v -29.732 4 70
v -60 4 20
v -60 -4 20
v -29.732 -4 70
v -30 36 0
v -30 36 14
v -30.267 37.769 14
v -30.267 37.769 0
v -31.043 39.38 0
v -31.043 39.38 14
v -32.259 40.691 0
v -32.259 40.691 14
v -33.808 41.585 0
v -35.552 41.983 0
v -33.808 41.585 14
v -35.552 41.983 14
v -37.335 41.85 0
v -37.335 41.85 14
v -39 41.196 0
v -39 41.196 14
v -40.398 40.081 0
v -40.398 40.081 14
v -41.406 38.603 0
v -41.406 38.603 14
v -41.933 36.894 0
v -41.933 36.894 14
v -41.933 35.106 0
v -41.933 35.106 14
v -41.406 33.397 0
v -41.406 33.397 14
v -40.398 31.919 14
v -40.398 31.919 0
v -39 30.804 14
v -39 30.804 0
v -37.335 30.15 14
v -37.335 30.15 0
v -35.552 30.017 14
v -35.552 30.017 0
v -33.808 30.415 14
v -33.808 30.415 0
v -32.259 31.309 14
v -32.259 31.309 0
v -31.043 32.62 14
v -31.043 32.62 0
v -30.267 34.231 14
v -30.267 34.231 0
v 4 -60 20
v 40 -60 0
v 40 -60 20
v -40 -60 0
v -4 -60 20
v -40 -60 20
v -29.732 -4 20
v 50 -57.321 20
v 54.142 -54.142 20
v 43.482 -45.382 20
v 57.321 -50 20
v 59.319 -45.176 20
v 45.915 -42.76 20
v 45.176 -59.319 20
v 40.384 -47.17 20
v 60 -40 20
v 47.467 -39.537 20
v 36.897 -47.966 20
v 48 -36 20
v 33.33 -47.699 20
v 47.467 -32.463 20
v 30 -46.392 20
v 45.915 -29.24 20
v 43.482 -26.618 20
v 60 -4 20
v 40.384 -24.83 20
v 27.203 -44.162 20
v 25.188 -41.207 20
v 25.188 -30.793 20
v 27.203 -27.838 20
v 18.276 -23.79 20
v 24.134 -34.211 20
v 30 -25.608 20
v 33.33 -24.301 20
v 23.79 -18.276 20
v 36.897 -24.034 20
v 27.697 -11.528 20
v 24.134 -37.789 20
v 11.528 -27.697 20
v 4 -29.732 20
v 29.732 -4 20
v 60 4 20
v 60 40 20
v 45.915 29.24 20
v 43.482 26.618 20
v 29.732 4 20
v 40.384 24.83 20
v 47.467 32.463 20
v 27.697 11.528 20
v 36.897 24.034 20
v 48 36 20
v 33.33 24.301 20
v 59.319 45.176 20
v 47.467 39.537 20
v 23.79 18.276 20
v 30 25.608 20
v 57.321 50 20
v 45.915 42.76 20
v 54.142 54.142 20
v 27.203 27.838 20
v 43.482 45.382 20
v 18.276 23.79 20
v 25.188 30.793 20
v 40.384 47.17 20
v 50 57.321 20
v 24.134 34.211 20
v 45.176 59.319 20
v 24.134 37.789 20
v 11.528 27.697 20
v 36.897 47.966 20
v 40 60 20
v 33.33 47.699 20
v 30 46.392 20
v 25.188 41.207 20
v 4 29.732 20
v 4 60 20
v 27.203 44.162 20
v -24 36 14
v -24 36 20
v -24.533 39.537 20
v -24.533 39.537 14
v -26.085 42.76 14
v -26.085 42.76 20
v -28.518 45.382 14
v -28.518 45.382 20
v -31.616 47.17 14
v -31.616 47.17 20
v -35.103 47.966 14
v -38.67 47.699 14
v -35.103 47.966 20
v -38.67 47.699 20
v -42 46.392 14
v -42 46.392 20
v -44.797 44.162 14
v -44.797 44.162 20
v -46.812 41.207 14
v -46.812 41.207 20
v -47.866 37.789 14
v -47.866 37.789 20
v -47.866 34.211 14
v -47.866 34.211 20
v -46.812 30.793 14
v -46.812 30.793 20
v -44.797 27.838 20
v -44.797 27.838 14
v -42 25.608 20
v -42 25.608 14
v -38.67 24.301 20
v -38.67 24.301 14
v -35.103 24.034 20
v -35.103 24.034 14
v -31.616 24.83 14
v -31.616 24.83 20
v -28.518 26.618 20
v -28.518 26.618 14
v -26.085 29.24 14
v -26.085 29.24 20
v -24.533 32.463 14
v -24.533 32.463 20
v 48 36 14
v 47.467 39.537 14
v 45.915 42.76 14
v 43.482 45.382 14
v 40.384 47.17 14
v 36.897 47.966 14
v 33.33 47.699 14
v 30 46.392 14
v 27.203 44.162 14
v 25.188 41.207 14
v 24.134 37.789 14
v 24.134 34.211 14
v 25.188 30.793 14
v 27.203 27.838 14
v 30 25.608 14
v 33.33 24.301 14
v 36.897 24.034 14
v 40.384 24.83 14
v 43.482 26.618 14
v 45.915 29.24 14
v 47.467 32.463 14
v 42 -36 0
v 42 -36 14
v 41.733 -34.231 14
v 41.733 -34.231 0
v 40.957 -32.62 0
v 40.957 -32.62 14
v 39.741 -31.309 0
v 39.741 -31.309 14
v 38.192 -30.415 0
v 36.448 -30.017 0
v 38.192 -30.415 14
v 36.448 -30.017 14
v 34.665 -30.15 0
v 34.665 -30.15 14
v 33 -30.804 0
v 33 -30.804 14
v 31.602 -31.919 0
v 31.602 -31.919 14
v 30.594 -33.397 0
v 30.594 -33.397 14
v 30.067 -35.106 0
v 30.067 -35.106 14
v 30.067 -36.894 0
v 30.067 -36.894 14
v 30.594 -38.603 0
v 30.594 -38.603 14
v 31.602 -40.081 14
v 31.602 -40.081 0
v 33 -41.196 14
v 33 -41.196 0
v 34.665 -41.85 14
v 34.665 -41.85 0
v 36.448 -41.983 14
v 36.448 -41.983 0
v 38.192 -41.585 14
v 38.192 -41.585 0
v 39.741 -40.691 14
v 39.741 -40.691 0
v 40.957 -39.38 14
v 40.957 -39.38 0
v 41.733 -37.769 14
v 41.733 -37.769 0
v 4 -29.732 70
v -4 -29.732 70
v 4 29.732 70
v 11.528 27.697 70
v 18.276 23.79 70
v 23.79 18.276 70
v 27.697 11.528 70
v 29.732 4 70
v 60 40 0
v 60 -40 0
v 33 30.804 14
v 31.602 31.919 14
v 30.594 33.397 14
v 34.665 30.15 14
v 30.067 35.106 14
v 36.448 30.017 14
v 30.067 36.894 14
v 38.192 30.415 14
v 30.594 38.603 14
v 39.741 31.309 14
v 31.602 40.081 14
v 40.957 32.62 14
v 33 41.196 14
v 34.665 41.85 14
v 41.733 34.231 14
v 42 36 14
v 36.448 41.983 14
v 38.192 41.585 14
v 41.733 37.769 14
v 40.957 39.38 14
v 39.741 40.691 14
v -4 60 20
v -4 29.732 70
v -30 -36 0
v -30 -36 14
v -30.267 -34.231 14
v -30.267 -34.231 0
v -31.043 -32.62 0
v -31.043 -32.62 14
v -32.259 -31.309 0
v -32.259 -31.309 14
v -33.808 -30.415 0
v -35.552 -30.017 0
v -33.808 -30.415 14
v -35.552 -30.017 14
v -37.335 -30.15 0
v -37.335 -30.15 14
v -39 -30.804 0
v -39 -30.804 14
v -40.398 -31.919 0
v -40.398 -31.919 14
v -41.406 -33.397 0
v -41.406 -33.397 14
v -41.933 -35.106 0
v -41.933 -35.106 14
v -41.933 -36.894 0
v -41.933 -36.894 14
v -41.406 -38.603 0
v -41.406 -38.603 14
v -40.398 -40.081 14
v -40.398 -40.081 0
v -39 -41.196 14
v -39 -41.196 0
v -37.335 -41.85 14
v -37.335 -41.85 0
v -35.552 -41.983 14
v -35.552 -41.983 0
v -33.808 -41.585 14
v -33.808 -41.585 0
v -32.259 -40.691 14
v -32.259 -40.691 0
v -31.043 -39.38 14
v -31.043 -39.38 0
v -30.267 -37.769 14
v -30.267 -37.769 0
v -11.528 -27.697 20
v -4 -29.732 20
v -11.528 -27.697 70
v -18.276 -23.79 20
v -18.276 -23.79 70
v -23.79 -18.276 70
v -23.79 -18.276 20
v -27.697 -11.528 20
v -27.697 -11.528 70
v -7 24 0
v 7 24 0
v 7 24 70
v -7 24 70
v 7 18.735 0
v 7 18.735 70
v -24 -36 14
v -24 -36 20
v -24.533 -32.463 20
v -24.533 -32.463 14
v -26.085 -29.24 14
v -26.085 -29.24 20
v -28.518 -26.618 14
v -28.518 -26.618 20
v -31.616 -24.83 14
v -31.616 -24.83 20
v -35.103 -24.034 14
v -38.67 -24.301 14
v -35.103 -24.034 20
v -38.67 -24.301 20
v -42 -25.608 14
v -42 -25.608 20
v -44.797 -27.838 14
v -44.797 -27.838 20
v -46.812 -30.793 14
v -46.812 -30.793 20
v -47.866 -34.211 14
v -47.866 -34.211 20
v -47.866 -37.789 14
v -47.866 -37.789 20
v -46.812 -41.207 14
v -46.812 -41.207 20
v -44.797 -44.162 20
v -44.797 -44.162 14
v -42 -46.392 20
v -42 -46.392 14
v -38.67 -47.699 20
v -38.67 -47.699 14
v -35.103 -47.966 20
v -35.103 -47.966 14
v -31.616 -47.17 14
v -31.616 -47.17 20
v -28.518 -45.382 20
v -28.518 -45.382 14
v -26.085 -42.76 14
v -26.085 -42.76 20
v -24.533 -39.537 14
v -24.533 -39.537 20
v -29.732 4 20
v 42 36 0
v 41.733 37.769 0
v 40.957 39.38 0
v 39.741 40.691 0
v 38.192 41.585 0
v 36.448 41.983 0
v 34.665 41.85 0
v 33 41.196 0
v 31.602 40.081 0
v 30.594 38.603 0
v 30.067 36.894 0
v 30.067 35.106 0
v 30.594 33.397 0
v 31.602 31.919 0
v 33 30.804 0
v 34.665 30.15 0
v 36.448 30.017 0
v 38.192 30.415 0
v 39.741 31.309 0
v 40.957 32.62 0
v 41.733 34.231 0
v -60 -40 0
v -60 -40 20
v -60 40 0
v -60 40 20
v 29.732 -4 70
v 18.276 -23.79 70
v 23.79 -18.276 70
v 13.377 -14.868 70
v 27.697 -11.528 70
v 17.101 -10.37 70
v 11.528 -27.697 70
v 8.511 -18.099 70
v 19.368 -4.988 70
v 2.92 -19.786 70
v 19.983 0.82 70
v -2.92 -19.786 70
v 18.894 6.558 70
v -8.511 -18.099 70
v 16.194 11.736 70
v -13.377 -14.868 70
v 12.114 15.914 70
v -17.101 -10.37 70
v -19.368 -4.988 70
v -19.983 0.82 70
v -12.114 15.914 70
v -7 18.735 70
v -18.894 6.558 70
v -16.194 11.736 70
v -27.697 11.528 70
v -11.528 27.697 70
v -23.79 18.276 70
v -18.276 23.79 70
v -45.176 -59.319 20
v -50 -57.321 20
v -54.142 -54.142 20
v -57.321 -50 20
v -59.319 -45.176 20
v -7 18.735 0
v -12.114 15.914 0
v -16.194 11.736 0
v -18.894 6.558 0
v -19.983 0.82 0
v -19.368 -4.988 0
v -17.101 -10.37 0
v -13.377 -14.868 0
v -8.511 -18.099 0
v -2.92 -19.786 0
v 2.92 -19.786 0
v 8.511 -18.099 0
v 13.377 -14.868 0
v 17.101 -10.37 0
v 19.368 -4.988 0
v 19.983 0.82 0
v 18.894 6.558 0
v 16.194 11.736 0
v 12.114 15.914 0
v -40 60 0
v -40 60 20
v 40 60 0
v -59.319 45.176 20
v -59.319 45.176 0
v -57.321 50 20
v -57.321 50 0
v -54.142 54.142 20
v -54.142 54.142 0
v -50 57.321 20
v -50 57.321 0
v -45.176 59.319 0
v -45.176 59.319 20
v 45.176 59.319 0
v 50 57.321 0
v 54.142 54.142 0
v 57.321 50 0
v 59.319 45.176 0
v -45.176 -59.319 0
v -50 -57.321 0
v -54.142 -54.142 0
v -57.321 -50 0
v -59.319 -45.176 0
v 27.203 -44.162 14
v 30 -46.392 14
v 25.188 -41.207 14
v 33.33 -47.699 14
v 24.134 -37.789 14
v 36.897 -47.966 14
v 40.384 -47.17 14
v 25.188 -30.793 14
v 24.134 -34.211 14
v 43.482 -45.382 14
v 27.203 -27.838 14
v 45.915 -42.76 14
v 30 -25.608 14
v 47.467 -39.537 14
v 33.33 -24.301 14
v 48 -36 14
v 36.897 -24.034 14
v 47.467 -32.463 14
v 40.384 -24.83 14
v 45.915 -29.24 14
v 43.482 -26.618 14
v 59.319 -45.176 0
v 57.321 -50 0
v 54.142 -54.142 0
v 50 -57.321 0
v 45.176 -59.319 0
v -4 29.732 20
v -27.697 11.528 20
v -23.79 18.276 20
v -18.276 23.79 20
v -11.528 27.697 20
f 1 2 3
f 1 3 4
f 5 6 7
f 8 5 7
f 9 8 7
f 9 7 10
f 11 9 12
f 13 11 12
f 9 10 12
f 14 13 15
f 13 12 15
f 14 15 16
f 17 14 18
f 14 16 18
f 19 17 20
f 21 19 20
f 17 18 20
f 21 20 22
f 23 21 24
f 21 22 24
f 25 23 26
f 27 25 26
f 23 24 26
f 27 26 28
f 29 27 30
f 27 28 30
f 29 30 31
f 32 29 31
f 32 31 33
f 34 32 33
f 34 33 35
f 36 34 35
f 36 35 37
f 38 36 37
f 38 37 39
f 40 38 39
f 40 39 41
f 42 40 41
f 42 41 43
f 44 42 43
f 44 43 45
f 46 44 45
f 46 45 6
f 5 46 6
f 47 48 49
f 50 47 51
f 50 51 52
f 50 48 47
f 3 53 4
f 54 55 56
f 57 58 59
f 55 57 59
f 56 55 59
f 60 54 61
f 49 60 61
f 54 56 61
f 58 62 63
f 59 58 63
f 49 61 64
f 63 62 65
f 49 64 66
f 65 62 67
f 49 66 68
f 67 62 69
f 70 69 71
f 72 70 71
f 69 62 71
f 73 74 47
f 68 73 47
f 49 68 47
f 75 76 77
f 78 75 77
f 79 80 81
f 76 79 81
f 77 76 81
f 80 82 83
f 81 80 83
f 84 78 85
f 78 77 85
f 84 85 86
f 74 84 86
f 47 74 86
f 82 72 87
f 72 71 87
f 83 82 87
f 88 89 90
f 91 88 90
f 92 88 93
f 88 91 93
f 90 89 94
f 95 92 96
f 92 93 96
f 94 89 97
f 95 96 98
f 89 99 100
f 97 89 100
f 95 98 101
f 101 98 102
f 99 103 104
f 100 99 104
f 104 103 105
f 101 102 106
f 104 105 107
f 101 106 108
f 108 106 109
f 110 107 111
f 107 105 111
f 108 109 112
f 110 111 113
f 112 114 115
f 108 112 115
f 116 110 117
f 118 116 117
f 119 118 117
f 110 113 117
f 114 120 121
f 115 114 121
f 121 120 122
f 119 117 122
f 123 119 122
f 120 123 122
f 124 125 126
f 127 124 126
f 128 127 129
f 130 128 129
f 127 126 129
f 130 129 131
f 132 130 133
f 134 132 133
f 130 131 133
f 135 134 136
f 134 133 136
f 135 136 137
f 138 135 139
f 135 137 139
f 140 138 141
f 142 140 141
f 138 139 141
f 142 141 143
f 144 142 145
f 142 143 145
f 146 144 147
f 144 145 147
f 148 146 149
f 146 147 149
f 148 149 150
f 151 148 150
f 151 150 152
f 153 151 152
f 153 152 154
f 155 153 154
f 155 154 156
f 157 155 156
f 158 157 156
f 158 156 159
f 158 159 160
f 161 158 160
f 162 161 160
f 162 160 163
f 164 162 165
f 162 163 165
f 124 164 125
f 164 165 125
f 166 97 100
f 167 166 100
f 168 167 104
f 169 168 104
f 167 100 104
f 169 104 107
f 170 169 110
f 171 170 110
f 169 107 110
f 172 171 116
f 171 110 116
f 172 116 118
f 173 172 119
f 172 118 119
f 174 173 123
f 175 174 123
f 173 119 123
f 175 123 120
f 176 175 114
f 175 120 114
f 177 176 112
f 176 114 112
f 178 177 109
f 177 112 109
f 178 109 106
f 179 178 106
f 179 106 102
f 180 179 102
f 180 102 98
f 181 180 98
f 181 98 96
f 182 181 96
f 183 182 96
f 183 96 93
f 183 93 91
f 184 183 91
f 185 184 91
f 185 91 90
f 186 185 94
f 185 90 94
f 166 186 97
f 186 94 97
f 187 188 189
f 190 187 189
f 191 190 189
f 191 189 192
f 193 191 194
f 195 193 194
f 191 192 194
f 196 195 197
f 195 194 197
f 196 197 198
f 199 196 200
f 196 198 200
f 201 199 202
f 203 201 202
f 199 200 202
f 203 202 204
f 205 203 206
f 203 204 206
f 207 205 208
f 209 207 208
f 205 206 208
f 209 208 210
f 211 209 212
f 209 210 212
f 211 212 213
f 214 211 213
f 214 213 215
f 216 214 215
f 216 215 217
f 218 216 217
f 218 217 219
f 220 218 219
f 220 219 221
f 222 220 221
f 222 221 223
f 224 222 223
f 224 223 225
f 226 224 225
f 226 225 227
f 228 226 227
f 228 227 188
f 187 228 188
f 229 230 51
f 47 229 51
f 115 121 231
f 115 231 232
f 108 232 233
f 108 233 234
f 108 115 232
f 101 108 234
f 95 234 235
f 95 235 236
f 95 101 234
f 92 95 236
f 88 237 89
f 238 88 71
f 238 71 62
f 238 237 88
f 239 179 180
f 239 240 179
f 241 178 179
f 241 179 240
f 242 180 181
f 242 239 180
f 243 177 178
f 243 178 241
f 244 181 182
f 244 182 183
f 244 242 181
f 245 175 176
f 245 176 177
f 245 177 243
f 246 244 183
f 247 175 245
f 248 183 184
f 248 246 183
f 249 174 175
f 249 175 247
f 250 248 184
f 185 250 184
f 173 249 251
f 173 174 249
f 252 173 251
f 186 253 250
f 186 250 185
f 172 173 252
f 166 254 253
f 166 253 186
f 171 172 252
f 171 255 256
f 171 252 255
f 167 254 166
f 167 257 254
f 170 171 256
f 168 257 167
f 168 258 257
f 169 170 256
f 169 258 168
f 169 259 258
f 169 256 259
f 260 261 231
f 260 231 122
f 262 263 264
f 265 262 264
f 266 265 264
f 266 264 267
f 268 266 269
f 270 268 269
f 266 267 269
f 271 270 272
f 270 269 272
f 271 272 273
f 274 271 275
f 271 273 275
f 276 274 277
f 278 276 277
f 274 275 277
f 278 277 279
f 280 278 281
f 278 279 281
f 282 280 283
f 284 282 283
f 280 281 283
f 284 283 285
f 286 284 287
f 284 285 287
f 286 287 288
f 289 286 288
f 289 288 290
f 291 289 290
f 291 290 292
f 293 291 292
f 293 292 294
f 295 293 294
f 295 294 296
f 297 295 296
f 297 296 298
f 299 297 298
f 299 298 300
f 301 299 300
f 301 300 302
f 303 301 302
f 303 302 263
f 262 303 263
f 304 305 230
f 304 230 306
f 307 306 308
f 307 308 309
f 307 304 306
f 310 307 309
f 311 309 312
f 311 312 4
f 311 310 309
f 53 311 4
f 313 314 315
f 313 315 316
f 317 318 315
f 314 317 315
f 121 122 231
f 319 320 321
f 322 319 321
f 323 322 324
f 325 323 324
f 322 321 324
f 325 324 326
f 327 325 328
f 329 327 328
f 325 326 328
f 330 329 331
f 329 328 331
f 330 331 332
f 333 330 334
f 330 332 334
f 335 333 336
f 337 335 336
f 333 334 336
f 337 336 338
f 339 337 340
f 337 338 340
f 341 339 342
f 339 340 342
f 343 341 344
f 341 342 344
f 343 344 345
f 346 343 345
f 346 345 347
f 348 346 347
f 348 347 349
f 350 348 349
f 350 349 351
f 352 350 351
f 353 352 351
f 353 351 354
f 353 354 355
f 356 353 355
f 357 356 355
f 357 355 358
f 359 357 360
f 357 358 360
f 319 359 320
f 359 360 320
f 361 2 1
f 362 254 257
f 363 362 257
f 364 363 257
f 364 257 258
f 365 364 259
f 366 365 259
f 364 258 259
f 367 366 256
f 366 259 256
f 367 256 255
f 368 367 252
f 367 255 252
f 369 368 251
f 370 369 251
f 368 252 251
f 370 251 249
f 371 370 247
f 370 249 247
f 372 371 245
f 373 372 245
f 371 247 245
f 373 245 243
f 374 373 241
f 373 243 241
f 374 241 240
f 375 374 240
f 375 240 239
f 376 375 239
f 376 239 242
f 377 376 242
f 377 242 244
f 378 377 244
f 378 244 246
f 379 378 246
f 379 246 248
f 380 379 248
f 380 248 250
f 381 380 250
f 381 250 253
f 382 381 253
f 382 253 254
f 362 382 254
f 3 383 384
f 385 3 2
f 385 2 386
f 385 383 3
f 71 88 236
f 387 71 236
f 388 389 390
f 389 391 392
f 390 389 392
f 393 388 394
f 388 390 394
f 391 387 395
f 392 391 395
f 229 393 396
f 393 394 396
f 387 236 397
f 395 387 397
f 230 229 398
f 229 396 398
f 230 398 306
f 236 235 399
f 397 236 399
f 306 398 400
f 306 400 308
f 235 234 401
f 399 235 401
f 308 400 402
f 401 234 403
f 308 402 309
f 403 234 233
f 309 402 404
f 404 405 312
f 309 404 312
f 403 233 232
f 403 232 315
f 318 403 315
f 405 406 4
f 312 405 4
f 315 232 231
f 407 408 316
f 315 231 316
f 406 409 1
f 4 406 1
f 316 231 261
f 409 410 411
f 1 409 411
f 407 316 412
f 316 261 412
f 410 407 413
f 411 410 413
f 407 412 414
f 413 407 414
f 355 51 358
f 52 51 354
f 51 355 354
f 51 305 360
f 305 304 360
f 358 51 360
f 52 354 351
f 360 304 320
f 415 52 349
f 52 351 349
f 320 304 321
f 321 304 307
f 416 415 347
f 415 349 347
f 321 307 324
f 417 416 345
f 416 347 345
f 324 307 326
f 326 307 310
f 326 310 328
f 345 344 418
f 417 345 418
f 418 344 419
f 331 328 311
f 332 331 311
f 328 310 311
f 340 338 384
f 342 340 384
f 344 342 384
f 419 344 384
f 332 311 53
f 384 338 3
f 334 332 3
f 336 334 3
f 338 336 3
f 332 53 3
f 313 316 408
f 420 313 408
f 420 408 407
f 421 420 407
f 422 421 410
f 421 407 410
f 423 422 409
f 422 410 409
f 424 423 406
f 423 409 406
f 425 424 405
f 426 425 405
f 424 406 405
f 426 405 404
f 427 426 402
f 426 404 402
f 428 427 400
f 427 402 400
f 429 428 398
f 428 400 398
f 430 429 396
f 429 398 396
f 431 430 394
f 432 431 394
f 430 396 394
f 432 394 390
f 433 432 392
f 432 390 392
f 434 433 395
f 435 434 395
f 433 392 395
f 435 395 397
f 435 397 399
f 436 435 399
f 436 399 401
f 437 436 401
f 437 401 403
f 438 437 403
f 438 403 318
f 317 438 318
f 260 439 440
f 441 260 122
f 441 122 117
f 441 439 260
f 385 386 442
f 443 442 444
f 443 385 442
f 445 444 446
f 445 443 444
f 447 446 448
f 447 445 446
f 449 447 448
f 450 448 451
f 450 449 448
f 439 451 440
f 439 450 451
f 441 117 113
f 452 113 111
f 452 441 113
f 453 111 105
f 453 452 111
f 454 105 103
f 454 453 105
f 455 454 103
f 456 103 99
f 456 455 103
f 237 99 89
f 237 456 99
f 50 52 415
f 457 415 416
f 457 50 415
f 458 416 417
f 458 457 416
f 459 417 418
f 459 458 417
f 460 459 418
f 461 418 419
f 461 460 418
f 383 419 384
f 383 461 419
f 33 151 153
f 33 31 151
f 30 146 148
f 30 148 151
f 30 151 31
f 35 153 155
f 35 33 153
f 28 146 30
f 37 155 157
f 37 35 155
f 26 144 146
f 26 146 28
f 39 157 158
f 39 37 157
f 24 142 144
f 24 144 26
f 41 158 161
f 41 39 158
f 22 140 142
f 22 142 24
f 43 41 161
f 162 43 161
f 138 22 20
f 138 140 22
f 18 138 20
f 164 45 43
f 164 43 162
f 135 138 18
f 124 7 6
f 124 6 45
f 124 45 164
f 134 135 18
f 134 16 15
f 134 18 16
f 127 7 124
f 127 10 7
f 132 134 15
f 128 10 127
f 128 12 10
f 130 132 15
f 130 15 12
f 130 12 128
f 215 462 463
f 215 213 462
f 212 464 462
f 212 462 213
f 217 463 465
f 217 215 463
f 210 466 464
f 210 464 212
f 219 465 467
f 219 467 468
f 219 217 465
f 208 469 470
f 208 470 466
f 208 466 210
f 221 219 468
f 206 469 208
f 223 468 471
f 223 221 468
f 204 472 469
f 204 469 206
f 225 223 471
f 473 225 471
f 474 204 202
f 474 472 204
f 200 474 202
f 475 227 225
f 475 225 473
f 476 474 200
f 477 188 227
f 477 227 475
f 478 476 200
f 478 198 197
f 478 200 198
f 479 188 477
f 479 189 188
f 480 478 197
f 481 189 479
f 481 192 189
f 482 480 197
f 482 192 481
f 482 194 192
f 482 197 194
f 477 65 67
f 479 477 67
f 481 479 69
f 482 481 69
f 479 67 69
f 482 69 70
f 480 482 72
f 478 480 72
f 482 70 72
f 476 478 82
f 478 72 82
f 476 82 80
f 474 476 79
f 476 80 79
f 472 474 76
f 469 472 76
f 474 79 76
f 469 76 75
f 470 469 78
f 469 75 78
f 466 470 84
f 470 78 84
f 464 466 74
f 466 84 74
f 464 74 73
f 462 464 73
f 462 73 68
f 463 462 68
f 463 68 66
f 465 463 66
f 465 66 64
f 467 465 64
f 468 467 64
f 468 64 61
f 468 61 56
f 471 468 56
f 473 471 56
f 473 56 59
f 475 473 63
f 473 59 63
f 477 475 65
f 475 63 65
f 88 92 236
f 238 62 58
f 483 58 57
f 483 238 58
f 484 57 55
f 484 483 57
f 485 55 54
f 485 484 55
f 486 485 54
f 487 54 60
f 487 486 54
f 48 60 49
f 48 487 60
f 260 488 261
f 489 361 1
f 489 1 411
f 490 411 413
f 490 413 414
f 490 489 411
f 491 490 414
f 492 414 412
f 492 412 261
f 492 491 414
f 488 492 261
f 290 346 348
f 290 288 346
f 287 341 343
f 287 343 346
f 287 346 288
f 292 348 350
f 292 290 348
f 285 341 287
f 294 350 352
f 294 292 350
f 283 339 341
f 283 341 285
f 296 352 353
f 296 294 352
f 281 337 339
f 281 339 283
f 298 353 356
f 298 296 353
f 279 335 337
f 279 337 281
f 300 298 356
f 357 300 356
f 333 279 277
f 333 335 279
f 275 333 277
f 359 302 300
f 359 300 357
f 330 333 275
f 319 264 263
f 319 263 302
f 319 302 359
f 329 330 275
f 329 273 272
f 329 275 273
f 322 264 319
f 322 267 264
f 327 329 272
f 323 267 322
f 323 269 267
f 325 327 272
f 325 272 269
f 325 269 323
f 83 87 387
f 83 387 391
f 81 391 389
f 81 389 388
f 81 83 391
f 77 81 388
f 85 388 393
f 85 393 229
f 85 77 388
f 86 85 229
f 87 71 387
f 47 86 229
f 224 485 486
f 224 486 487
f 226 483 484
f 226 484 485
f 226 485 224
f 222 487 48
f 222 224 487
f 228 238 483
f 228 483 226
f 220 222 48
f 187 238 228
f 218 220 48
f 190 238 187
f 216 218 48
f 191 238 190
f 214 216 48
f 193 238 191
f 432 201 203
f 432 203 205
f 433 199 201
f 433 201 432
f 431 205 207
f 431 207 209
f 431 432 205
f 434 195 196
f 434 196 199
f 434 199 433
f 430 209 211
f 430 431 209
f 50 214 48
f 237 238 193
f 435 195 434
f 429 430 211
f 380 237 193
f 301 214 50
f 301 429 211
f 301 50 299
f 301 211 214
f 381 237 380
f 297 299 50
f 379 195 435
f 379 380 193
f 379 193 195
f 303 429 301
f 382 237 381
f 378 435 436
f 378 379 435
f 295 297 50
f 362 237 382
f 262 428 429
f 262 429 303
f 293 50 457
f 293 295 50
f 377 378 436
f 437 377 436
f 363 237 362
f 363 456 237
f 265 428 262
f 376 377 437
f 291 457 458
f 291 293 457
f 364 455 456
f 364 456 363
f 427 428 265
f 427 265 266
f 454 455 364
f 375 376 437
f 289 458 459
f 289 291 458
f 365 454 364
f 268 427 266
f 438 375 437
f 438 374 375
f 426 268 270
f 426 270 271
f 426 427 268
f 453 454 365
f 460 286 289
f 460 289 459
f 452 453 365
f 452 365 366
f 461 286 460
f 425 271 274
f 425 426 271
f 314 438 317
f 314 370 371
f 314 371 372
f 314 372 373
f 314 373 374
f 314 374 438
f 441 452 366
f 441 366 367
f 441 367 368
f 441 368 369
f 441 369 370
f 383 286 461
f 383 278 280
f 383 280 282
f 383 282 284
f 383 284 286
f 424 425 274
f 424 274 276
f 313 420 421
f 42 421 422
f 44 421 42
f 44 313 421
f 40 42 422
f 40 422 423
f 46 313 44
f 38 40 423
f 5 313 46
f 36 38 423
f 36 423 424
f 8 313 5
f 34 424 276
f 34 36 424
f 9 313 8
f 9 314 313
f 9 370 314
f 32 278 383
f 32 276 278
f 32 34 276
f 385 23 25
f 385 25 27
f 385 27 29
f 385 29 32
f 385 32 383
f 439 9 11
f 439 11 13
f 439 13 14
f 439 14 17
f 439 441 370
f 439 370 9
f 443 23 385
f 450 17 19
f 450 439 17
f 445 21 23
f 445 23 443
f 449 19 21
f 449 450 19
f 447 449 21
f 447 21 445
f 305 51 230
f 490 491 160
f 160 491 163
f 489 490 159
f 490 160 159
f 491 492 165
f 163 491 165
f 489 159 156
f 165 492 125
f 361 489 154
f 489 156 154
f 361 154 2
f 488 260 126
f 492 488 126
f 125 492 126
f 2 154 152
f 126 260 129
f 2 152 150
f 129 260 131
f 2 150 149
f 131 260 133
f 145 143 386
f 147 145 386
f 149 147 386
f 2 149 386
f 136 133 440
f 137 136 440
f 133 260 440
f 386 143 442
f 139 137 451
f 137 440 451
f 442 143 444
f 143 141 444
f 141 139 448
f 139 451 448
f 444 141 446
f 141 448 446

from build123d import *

# Parameters (mm, degrees)
Y_KSEKLIK_EKSTR_ZYON1_DEPTH = 20
IZIM2_R                     = 12
KES_EKSTR_ZYON1_DEPTH       = 6
IZIM3_R                     = 6
KES_EKSTR_ZYON2_DEPTH       = 88.177978871
Y_KSEKLIK_EKSTR_ZYON2_DEPTH = 50
KES_EKSTR_ZYON3_DEPTH       = 111
KES_EKSTR_ZYON4_DEPTH       = 113.231902773
KES_EKSTR_ZYON5_DEPTH       = 113.231902773
KES_EKSTR_ZYON6_DEPTH       = 113.231902773


with BuildPart() as part:
    # Çizim1 → Yükseklik-Ekstrüzyon1 (new body)
    with BuildSketch(Plane.XY):
        with BuildLine():
            Line((40, -60), (-40, -60))
            ThreePointArc((-40, -60), (-54.142135624, -54.142135624), (-60, -40))
            Line((-60, -40), (-60, 40))
            ThreePointArc((-60, 40), (-54.142135624, 54.142135624), (-40, 60))
            Line((-40, 60), (40, 60))
            ThreePointArc((40, 60), (54.142135624, 54.142135624), (60, 40))
            Line((60, 40), (60, -40))
            ThreePointArc((60, -40), (54.142135624, -54.142135624), (40, -60))
        make_face()
    extrude(amount=Y_KSEKLIK_EKSTR_ZYON1_DEPTH)

    # Çizim2 → Kes-Ekstrüzyon1 (cut)
    with BuildSketch(Plane.XY.offset(20)):
        with Locations((-36, 36)):
            Circle(IZIM2_R)
        with Locations((36, 36)):
            Circle(IZIM2_R)
        with Locations((-36, -36)):
            Circle(IZIM2_R)
        with Locations((36, -36)):
            Circle(IZIM2_R)
    extrude(amount=-KES_EKSTR_ZYON1_DEPTH, mode=Mode.SUBTRACT)

    # Çizim3 → Kes-Ekstrüzyon2 (cut, through all)
    with BuildSketch(Plane.XY.offset(20)):
        with Locations((-36, 36)):
            Circle(IZIM3_R)
        with Locations((36, 36)):
            Circle(IZIM3_R)
        with Locations((36, -36)):
            Circle(IZIM3_R)
        with Locations((-36, -36)):
            Circle(IZIM3_R)
    extrude(amount=-KES_EKSTR_ZYON2_DEPTH, mode=Mode.SUBTRACT)

    # Çizim4 → Yükseklik-Ekstrüzyon2 (add)
    with BuildSketch(Plane.XY.offset(20)):
        with BuildLine():
            Line((4, -60), (-4, -60))
            Line((-4, -60), (-4, -29.732137495))
            ThreePointArc((-4, -29.732137495), (-21.213203436, -21.213203436), (-29.732137495, -4))
            Line((-29.732137495, -4), (-60, -4))
            Line((-60, -4), (-60, 4))
            Line((-60, 4), (-29.732137495, 4))
            ThreePointArc((-29.732137495, 4), (-21.213203436, 21.213203436), (-4, 29.732137495))
            Line((-4, 29.732137495), (-4, 60))
            Line((-4, 60), (4, 60))
            Line((4, 60), (4, 29.732137495))
            ThreePointArc((4, 29.732137495), (21.213203436, 21.213203436), (29.732137495, 4))
            Line((29.732137495, 4), (60, 4))
            Line((60, 4), (60, -4))
            Line((60, -4), (29.732137495, -4))
            ThreePointArc((29.732137495, -4), (21.213203436, -21.213203436), (4, -29.732137495))
            Line((4, -29.732137495), (4, -60))
        make_face()
    extrude(amount=Y_KSEKLIK_EKSTR_ZYON2_DEPTH)

    # Çizim5 → Kes-Ekstrüzyon3 (cut, through all)
    with BuildSketch(Plane.XY.offset(70)):
        with BuildLine():
            Line((7, 18.734993995), (7, 24))
            Line((7, 24), (-7, 24))
            Line((-7, 24), (-7, 18.734993995))
            ThreePointArc((-7, 18.734993995), (0, -20), (7, 18.734993995))
        make_face()
    extrude(amount=-KES_EKSTR_ZYON3_DEPTH, mode=Mode.SUBTRACT)

    # Çizim6 → Kes-Ekstrüzyon4 (cut, through all)
    with BuildSketch(Plane.ZY.offset(4)):
        Polygon((70, 60), (70, 29.732137495), (20, 60), align=None)
    extrude(amount=-KES_EKSTR_ZYON4_DEPTH, mode=Mode.SUBTRACT)

    # Çizim7 → Kes-Ekstrüzyon5 (cut, through all)
    with BuildSketch(Plane.ZY.offset(4)):
        Polygon((70, -29.732137495), (20, -60), (70, -60), align=None)
    extrude(amount=-KES_EKSTR_ZYON5_DEPTH, mode=Mode.SUBTRACT)

    # Çizim8 → Kes-Ekstrüzyon6 (cut, through all)
    with BuildSketch(Plane(origin=(0, 4, 0), x_dir=(1, 0, 0), z_dir=(0, 1, 0))):
        Polygon((-60, -20), (-29.732137495, -70), (-60, -70), align=None)
        Polygon((60, -20), (29.732137495, -70), (60, -70), align=None)
    extrude(amount=-KES_EKSTR_ZYON6_DEPTH, mode=Mode.SUBTRACT)


solid = part.part
